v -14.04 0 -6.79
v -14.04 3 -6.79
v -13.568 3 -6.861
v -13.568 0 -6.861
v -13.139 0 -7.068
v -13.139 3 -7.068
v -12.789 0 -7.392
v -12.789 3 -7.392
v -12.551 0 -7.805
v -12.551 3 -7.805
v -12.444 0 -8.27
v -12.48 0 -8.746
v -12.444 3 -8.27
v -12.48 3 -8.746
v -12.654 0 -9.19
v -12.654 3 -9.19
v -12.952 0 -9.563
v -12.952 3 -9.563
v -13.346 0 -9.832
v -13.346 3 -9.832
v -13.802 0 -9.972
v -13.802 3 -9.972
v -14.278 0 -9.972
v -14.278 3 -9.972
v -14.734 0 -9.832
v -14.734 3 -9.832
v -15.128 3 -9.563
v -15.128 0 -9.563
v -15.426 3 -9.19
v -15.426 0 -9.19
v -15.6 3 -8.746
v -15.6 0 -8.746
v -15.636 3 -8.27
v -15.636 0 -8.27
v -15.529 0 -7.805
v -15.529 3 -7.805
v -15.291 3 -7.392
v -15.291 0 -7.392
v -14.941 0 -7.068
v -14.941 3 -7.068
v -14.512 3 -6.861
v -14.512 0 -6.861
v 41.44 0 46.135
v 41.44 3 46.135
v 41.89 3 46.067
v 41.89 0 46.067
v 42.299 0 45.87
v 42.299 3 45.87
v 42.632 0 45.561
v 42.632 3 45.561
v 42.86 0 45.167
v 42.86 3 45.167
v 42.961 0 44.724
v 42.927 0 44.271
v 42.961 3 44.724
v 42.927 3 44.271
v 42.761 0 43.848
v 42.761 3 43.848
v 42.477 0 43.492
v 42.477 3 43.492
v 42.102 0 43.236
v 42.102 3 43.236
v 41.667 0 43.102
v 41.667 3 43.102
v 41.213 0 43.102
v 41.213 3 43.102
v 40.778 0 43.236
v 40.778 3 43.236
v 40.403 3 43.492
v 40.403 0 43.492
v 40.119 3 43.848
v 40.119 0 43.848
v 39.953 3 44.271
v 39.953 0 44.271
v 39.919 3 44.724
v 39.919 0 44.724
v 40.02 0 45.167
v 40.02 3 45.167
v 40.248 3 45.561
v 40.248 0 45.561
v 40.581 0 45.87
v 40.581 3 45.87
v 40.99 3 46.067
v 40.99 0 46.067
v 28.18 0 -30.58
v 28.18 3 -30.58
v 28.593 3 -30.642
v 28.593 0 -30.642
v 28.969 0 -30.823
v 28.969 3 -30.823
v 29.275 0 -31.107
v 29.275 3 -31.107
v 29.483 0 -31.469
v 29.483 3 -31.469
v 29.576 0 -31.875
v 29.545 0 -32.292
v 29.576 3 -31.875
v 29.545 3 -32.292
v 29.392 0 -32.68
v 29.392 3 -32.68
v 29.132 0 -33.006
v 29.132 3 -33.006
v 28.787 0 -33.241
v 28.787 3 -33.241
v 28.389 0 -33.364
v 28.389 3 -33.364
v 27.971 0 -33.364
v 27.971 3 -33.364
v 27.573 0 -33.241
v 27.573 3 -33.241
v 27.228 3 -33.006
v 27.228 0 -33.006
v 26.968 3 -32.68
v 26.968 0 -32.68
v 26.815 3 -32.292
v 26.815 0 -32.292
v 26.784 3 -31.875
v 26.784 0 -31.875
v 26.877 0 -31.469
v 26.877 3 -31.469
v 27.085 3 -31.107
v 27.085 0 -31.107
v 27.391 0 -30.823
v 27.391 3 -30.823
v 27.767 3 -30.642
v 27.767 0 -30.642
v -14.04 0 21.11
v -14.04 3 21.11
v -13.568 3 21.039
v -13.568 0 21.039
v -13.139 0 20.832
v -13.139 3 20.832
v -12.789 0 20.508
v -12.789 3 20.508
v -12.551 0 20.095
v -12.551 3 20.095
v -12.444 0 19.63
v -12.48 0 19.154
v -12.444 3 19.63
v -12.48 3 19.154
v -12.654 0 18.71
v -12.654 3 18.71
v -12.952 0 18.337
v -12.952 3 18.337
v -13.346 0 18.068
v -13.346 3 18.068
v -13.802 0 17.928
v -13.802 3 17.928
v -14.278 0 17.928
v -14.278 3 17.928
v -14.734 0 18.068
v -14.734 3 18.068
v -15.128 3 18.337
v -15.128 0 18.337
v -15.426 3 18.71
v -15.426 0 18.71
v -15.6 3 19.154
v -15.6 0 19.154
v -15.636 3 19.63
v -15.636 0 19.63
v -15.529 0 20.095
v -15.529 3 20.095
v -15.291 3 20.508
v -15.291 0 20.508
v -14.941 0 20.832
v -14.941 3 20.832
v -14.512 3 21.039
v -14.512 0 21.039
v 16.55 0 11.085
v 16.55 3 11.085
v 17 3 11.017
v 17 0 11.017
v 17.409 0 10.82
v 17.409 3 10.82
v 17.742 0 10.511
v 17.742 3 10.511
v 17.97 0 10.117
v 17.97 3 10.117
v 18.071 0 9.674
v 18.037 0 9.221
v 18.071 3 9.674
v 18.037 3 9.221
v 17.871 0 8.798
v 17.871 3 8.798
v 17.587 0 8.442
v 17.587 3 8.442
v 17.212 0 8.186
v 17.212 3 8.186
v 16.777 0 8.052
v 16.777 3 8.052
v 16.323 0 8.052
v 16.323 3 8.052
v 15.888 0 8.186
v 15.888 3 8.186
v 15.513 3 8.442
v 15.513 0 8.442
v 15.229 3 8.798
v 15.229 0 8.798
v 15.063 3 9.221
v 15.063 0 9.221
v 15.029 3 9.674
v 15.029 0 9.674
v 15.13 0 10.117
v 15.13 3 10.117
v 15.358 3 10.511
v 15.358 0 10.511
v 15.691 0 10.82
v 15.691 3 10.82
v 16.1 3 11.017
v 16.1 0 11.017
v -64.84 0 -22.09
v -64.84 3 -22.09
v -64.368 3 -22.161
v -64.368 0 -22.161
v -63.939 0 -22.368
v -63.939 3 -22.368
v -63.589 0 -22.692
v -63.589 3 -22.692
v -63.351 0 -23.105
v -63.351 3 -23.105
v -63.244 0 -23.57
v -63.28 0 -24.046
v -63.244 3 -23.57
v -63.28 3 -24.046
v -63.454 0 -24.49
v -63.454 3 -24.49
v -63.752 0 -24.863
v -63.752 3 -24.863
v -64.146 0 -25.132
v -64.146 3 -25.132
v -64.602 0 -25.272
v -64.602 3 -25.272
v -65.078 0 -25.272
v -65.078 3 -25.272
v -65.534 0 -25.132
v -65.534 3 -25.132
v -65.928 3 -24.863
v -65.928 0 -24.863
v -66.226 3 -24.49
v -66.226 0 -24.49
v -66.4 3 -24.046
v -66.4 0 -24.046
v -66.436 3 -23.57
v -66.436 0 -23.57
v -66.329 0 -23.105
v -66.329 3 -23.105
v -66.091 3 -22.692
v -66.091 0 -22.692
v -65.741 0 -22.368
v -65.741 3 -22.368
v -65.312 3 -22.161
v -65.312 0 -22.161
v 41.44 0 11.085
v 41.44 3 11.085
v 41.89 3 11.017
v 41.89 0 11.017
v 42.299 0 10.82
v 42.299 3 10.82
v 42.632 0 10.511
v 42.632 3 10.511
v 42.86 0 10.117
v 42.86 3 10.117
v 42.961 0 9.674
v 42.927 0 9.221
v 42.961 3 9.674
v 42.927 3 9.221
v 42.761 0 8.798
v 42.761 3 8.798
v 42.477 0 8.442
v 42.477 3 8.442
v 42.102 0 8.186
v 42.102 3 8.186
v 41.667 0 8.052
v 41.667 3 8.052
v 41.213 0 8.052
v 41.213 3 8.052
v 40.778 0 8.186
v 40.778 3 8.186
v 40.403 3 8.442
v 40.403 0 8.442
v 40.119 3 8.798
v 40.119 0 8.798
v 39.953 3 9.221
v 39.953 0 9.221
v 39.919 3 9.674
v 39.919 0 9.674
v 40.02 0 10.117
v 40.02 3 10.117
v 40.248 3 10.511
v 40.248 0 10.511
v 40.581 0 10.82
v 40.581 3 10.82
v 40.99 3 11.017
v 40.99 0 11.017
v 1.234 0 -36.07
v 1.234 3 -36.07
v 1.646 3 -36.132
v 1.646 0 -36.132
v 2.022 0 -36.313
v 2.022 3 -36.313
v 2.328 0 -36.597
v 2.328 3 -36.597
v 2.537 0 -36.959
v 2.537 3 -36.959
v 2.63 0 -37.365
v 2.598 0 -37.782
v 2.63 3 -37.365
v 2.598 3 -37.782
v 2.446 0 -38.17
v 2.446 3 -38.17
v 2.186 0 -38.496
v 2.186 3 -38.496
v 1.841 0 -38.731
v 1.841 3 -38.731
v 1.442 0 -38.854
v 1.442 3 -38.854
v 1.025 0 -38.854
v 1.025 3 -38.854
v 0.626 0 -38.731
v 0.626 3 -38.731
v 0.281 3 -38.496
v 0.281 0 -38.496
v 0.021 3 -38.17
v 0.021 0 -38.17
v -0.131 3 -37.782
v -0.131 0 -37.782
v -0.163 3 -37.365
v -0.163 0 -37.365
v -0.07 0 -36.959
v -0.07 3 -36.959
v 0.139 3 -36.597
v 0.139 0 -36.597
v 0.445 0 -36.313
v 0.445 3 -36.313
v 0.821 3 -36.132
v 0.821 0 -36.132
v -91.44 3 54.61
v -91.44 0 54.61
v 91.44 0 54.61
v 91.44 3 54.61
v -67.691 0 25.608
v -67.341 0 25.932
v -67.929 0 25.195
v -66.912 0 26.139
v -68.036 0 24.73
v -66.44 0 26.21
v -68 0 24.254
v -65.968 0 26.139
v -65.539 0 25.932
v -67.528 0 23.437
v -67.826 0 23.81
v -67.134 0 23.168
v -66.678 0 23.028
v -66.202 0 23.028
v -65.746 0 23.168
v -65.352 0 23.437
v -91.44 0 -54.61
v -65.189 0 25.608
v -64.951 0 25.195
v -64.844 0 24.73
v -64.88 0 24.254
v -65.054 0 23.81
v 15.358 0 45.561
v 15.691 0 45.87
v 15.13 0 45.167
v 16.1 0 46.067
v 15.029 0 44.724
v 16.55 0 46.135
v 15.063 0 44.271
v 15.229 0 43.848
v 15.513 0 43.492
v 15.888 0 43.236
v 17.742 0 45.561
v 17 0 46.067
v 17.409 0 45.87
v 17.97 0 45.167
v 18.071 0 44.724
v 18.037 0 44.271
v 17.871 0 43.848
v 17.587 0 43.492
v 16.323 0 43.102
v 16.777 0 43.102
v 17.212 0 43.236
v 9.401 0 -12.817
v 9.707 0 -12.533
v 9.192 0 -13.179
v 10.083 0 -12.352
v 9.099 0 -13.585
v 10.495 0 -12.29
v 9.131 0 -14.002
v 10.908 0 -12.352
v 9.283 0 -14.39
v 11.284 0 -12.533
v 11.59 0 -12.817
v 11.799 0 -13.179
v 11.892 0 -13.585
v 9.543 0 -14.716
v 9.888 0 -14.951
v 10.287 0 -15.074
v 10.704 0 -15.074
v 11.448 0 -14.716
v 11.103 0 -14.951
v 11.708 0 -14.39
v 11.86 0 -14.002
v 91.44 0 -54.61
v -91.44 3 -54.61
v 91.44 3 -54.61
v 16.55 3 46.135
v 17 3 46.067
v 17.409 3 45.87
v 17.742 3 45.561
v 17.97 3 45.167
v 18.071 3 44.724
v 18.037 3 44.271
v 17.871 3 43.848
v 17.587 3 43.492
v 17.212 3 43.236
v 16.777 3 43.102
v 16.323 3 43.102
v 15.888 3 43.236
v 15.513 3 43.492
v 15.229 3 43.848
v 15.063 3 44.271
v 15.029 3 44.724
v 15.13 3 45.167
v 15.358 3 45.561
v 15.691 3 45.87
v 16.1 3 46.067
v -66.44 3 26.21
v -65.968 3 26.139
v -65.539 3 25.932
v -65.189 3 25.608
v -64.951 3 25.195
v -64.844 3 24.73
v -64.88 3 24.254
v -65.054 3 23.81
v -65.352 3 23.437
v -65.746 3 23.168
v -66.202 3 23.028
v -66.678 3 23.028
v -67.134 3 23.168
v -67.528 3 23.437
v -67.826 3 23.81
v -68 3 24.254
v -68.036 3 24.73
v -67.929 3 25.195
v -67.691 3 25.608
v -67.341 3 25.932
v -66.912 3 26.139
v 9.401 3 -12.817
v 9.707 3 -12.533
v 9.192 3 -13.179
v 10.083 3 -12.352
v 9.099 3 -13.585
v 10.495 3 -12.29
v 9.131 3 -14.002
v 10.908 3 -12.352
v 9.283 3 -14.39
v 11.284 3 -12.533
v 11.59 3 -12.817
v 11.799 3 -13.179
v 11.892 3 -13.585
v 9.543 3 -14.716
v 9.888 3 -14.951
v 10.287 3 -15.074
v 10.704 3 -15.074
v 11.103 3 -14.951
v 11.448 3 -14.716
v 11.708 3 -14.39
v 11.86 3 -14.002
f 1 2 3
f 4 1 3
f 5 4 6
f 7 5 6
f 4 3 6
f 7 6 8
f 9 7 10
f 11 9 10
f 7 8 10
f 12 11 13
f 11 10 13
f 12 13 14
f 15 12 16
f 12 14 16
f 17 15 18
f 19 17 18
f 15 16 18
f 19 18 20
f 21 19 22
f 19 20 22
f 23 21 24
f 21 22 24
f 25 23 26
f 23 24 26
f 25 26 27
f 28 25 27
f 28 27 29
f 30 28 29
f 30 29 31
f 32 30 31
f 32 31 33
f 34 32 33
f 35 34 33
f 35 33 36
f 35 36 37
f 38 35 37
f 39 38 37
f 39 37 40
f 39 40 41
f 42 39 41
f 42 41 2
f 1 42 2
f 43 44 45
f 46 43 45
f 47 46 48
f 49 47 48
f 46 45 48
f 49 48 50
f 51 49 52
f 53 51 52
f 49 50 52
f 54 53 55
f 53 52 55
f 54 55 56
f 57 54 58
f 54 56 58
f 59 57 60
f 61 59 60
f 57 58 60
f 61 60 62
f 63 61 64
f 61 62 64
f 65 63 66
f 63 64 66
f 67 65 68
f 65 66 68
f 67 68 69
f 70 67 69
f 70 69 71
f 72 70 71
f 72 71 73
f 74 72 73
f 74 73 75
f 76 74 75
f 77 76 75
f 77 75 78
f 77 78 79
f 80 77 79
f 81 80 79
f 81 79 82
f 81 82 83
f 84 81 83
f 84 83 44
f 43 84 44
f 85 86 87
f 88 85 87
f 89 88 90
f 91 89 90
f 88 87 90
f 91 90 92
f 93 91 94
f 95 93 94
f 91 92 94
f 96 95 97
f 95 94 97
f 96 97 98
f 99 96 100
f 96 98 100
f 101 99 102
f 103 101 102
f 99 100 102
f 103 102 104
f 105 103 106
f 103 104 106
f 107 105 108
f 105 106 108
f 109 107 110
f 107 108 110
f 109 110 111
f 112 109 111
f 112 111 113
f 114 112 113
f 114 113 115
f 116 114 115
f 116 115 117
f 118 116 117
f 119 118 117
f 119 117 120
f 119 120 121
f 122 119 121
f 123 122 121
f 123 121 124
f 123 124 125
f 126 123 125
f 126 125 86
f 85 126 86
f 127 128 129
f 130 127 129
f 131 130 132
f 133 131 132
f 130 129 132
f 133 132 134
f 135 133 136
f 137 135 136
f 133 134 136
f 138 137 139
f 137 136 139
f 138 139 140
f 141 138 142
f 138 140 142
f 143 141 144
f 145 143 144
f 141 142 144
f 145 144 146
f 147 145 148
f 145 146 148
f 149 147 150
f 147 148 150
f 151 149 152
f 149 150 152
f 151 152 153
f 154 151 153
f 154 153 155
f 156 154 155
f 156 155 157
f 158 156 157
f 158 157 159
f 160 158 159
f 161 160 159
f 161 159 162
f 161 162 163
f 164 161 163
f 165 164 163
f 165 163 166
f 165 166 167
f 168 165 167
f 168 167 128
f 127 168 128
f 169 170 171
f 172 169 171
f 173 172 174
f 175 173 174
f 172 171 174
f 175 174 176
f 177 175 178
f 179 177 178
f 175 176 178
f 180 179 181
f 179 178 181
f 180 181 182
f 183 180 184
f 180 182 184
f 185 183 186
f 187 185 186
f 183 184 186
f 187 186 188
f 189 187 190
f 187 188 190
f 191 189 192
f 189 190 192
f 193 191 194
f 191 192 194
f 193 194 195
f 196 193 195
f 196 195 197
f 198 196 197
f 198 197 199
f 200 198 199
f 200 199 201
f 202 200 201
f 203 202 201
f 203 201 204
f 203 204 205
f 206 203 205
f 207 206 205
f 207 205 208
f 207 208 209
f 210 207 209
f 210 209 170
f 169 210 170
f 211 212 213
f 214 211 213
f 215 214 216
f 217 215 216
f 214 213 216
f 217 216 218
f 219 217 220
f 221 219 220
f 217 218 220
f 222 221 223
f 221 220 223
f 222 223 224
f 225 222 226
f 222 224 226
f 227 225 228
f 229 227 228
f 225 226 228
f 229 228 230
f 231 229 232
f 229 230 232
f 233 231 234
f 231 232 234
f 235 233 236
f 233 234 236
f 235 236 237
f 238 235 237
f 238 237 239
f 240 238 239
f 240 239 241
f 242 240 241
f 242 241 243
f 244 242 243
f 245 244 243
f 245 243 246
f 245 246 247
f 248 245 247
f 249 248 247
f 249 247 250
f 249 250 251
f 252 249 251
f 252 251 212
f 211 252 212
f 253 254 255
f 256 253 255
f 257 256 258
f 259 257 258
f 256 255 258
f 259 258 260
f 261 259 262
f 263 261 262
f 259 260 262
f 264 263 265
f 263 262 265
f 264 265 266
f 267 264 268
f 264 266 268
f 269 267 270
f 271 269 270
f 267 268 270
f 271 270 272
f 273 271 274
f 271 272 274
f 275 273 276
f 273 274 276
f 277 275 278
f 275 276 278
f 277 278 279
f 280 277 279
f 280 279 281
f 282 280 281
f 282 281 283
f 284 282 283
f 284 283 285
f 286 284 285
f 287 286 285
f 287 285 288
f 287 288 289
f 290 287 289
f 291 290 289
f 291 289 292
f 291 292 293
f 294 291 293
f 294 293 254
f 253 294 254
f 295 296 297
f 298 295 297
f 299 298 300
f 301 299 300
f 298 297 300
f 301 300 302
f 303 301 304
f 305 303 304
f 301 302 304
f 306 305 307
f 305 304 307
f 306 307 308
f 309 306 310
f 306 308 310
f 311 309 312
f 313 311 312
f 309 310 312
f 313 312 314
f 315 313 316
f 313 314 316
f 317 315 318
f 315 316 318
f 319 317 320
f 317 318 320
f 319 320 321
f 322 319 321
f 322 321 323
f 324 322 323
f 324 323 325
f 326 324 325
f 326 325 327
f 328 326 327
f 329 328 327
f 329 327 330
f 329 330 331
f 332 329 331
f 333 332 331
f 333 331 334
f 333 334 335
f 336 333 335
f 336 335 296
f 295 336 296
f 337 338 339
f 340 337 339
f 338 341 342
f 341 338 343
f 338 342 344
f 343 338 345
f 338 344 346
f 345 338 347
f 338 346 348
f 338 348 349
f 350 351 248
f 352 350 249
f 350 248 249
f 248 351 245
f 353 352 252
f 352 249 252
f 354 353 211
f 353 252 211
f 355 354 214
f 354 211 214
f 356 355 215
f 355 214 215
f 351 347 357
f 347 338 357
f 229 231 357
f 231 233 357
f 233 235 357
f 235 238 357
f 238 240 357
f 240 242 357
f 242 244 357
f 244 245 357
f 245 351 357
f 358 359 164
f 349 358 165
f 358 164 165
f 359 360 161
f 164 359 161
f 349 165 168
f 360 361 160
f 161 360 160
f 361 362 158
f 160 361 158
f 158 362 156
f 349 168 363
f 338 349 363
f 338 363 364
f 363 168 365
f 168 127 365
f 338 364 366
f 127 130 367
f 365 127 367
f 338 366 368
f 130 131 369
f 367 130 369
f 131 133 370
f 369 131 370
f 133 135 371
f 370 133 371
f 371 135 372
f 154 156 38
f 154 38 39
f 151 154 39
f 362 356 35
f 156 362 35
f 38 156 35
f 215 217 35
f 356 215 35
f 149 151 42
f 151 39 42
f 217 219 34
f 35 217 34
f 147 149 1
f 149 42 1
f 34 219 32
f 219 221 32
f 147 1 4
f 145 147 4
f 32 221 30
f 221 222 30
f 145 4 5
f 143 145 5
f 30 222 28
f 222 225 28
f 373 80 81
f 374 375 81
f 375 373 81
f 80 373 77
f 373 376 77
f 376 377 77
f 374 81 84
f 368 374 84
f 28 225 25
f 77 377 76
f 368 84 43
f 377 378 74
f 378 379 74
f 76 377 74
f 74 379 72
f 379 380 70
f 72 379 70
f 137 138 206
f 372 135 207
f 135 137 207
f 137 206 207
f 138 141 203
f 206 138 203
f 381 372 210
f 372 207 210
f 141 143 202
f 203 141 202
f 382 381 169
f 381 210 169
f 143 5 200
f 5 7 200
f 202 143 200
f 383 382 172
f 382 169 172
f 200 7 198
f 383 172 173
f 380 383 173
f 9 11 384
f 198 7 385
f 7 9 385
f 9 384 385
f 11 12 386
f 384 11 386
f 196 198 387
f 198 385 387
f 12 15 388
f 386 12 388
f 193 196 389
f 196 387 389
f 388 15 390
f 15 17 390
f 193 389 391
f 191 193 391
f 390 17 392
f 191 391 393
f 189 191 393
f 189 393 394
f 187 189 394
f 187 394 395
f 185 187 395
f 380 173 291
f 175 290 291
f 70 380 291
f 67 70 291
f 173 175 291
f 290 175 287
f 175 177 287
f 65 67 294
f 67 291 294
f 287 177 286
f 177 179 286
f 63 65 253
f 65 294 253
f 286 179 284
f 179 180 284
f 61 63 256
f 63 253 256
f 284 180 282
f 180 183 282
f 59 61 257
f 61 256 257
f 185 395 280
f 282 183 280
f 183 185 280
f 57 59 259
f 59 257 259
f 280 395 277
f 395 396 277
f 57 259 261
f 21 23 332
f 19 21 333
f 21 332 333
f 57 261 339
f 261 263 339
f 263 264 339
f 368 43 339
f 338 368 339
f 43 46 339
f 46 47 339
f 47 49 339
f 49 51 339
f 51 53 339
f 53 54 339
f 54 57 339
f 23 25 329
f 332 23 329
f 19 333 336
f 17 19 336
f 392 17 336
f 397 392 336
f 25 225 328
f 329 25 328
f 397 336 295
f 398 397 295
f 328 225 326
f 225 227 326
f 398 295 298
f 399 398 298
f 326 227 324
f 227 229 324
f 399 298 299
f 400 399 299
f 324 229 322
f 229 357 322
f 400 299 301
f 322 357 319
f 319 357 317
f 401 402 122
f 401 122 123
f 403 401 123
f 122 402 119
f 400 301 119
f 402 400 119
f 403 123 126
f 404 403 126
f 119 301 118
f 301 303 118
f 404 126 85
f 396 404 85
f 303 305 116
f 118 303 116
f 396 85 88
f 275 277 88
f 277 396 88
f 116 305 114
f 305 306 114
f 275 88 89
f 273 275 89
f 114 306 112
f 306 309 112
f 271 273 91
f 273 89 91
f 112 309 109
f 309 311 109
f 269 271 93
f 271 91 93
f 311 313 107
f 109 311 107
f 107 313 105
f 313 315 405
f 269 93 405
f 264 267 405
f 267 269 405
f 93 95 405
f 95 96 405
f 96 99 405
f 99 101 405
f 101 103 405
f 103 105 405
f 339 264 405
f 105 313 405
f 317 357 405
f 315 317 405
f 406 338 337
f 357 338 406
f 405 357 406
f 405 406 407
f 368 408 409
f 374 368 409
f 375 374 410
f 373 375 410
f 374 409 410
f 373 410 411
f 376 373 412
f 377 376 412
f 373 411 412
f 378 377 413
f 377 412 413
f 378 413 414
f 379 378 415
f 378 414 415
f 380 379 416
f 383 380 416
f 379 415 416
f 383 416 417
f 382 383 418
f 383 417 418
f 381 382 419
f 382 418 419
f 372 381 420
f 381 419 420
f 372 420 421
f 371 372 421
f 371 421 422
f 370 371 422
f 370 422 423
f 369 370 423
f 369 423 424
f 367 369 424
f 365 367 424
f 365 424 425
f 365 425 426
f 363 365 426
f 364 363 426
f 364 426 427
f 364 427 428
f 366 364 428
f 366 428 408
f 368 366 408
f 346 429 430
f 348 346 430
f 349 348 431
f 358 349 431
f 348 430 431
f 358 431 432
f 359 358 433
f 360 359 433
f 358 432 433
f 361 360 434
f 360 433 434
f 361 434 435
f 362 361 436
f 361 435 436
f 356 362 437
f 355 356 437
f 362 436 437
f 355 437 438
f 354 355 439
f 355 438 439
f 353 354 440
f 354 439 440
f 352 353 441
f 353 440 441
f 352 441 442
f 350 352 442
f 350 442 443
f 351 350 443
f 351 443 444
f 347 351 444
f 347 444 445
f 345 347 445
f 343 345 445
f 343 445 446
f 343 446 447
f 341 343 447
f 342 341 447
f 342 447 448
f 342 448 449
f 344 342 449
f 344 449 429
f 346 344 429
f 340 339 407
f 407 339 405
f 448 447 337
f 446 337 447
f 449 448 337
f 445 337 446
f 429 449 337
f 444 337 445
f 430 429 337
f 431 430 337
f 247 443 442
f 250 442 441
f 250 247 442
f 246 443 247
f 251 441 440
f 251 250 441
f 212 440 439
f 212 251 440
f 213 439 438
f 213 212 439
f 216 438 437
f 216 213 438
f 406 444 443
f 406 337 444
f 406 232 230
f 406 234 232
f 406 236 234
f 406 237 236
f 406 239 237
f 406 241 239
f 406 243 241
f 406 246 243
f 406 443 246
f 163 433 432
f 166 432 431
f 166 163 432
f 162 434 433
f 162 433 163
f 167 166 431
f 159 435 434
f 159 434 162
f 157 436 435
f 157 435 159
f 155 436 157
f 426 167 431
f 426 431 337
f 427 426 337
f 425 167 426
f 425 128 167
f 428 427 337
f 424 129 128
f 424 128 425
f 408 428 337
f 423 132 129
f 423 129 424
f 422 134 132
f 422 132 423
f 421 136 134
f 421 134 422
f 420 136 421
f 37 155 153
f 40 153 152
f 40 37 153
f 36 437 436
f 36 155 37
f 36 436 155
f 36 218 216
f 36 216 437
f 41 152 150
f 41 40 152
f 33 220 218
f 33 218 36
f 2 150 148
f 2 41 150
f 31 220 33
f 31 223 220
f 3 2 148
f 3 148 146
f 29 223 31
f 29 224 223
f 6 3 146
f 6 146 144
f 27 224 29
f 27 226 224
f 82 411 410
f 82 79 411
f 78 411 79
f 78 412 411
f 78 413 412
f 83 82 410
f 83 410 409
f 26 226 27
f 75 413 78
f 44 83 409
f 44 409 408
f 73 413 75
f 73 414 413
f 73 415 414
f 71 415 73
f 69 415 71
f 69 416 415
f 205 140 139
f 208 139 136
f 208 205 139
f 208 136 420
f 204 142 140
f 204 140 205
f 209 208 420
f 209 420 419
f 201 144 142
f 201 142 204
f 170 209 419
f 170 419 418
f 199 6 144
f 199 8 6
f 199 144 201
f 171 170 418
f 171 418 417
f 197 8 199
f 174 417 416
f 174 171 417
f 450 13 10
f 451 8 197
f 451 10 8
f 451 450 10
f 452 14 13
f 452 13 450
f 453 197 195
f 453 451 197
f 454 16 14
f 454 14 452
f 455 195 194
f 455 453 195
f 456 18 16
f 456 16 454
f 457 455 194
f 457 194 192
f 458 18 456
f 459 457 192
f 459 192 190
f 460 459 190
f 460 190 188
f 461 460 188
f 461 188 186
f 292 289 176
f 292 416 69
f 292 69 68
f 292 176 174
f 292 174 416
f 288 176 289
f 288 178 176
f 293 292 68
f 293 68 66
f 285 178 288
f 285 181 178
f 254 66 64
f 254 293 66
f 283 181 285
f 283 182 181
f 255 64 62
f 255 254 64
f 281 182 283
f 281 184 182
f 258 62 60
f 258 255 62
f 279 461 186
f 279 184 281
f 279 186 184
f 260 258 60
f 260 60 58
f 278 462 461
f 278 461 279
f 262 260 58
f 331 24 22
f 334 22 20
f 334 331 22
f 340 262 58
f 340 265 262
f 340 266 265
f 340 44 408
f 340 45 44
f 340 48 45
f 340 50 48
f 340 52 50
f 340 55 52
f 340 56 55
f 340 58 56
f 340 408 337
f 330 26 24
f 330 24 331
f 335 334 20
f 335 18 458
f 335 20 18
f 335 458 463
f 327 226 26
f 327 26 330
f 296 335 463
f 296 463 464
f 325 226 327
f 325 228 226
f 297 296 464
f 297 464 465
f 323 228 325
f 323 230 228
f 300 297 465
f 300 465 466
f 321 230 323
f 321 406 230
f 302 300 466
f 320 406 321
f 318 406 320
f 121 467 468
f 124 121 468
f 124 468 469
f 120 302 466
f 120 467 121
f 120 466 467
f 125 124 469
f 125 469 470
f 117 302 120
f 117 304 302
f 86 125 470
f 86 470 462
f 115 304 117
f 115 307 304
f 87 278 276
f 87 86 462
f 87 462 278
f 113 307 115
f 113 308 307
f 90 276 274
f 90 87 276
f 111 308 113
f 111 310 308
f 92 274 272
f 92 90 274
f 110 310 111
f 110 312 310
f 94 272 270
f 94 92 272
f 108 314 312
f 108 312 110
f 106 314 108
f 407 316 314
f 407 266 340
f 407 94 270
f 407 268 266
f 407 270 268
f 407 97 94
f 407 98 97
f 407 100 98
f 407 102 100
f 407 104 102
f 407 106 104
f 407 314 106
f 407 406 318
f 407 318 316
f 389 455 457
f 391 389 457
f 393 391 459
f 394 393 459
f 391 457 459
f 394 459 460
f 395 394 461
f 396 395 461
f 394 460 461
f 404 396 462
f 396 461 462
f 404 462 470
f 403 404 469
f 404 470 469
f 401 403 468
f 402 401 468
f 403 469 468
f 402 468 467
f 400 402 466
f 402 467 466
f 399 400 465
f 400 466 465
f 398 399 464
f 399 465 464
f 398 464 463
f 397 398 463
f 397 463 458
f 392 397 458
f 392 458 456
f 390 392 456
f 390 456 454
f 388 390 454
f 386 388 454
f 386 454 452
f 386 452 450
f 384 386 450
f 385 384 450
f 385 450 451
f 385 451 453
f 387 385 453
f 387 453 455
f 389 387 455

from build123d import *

# Parameters (mm, degrees)
SKETCH1_W           = 182.88
SKETCH1_H           = 109.22
BOSS_EXTRUDE1_DEPTH = 3
SKETCH2_R           = 1.6
CUT_EXTRUDE1_DEPTH  = 10
SKETCH3_R           = 1.3999972
CUT_EXTRUDE2_DEPTH  = 107.548231801
SKETCH4_R           = 1.525
CUT_EXTRUDE3_DEPTH  = 107.548231801


with BuildPart() as part:
    # Sketch1 → Boss-Extrude1 (new body)
    with BuildSketch(Plane(origin=(0, 0, 0), x_dir=(1, 0, 0), z_dir=(0, 1, 0))):
        Rectangle(SKETCH1_W, SKETCH1_H)
    extrude(amount=BOSS_EXTRUDE1_DEPTH)

    # Sketch2 → Cut-Extrude1 (cut)
    with BuildSketch(Plane(origin=(0, 3, 0), x_dir=(1, 0, 0), z_dir=(0, 1, 0))):
        with Locations(Location((-66.44, -24.61, 0), (0, 0, 270))):
            Circle(SKETCH2_R)
        with Locations(Location((-64.84, 23.69, 0), (0, 0, 270))):
            Circle(SKETCH2_R)
        with Locations(Location((-14.04, 8.39, 0), (0, 0, 270))):
            Circle(SKETCH2_R)
        with Locations(Location((-14.04, -19.51, 0), (0, 0, 270))):
            Circle(SKETCH2_R)
    extrude(amount=-CUT_EXTRUDE1_DEPTH, mode=Mode.SUBTRACT)

    # Sketch3 → Cut-Extrude2 (cut, through all)
    with BuildSketch(Plane(origin=(0, 3, 0), x_dir=(1, 0, 0), z_dir=(0, 1, 0))):
        with Locations(Location((10.495430786, 13.69, 0), (0, 0, 270))):
            Circle(SKETCH3_R)
        with Locations(Location((1.233573521, 37.47, 0), (0, 0, 270))):
            Circle(SKETCH3_R)
        with Locations(Location((28.18, 31.98, 0), (0, 0, 270))):
            Circle(SKETCH3_R)
    extrude(amount=-CUT_EXTRUDE2_DEPTH, mode=Mode.SUBTRACT)

    # Sketch4 → Cut-Extrude3 (cut, through all)
    with BuildSketch(Plane(origin=(0, 3, 0), x_dir=(1, 0, 0), z_dir=(0, 1, 0))):
        with Locations(Location((16.55, -44.61, 0), (0, 0, 270))):
            Circle(SKETCH4_R)
        with Locations(Location((41.44, -9.56, 0), (0, 0, 270))):
            Circle(SKETCH4_R)
        with Locations(Location((16.55, -9.56, 0), (0, 0, 270))):
            Circle(SKETCH4_R)
        with Locations(Location((41.44, -44.61, 0), (0, 0, 270))):
            Circle(SKETCH4_R)
    extrude(amount=-CUT_EXTRUDE3_DEPTH, mode=Mode.SUBTRACT)


solid = part.part
